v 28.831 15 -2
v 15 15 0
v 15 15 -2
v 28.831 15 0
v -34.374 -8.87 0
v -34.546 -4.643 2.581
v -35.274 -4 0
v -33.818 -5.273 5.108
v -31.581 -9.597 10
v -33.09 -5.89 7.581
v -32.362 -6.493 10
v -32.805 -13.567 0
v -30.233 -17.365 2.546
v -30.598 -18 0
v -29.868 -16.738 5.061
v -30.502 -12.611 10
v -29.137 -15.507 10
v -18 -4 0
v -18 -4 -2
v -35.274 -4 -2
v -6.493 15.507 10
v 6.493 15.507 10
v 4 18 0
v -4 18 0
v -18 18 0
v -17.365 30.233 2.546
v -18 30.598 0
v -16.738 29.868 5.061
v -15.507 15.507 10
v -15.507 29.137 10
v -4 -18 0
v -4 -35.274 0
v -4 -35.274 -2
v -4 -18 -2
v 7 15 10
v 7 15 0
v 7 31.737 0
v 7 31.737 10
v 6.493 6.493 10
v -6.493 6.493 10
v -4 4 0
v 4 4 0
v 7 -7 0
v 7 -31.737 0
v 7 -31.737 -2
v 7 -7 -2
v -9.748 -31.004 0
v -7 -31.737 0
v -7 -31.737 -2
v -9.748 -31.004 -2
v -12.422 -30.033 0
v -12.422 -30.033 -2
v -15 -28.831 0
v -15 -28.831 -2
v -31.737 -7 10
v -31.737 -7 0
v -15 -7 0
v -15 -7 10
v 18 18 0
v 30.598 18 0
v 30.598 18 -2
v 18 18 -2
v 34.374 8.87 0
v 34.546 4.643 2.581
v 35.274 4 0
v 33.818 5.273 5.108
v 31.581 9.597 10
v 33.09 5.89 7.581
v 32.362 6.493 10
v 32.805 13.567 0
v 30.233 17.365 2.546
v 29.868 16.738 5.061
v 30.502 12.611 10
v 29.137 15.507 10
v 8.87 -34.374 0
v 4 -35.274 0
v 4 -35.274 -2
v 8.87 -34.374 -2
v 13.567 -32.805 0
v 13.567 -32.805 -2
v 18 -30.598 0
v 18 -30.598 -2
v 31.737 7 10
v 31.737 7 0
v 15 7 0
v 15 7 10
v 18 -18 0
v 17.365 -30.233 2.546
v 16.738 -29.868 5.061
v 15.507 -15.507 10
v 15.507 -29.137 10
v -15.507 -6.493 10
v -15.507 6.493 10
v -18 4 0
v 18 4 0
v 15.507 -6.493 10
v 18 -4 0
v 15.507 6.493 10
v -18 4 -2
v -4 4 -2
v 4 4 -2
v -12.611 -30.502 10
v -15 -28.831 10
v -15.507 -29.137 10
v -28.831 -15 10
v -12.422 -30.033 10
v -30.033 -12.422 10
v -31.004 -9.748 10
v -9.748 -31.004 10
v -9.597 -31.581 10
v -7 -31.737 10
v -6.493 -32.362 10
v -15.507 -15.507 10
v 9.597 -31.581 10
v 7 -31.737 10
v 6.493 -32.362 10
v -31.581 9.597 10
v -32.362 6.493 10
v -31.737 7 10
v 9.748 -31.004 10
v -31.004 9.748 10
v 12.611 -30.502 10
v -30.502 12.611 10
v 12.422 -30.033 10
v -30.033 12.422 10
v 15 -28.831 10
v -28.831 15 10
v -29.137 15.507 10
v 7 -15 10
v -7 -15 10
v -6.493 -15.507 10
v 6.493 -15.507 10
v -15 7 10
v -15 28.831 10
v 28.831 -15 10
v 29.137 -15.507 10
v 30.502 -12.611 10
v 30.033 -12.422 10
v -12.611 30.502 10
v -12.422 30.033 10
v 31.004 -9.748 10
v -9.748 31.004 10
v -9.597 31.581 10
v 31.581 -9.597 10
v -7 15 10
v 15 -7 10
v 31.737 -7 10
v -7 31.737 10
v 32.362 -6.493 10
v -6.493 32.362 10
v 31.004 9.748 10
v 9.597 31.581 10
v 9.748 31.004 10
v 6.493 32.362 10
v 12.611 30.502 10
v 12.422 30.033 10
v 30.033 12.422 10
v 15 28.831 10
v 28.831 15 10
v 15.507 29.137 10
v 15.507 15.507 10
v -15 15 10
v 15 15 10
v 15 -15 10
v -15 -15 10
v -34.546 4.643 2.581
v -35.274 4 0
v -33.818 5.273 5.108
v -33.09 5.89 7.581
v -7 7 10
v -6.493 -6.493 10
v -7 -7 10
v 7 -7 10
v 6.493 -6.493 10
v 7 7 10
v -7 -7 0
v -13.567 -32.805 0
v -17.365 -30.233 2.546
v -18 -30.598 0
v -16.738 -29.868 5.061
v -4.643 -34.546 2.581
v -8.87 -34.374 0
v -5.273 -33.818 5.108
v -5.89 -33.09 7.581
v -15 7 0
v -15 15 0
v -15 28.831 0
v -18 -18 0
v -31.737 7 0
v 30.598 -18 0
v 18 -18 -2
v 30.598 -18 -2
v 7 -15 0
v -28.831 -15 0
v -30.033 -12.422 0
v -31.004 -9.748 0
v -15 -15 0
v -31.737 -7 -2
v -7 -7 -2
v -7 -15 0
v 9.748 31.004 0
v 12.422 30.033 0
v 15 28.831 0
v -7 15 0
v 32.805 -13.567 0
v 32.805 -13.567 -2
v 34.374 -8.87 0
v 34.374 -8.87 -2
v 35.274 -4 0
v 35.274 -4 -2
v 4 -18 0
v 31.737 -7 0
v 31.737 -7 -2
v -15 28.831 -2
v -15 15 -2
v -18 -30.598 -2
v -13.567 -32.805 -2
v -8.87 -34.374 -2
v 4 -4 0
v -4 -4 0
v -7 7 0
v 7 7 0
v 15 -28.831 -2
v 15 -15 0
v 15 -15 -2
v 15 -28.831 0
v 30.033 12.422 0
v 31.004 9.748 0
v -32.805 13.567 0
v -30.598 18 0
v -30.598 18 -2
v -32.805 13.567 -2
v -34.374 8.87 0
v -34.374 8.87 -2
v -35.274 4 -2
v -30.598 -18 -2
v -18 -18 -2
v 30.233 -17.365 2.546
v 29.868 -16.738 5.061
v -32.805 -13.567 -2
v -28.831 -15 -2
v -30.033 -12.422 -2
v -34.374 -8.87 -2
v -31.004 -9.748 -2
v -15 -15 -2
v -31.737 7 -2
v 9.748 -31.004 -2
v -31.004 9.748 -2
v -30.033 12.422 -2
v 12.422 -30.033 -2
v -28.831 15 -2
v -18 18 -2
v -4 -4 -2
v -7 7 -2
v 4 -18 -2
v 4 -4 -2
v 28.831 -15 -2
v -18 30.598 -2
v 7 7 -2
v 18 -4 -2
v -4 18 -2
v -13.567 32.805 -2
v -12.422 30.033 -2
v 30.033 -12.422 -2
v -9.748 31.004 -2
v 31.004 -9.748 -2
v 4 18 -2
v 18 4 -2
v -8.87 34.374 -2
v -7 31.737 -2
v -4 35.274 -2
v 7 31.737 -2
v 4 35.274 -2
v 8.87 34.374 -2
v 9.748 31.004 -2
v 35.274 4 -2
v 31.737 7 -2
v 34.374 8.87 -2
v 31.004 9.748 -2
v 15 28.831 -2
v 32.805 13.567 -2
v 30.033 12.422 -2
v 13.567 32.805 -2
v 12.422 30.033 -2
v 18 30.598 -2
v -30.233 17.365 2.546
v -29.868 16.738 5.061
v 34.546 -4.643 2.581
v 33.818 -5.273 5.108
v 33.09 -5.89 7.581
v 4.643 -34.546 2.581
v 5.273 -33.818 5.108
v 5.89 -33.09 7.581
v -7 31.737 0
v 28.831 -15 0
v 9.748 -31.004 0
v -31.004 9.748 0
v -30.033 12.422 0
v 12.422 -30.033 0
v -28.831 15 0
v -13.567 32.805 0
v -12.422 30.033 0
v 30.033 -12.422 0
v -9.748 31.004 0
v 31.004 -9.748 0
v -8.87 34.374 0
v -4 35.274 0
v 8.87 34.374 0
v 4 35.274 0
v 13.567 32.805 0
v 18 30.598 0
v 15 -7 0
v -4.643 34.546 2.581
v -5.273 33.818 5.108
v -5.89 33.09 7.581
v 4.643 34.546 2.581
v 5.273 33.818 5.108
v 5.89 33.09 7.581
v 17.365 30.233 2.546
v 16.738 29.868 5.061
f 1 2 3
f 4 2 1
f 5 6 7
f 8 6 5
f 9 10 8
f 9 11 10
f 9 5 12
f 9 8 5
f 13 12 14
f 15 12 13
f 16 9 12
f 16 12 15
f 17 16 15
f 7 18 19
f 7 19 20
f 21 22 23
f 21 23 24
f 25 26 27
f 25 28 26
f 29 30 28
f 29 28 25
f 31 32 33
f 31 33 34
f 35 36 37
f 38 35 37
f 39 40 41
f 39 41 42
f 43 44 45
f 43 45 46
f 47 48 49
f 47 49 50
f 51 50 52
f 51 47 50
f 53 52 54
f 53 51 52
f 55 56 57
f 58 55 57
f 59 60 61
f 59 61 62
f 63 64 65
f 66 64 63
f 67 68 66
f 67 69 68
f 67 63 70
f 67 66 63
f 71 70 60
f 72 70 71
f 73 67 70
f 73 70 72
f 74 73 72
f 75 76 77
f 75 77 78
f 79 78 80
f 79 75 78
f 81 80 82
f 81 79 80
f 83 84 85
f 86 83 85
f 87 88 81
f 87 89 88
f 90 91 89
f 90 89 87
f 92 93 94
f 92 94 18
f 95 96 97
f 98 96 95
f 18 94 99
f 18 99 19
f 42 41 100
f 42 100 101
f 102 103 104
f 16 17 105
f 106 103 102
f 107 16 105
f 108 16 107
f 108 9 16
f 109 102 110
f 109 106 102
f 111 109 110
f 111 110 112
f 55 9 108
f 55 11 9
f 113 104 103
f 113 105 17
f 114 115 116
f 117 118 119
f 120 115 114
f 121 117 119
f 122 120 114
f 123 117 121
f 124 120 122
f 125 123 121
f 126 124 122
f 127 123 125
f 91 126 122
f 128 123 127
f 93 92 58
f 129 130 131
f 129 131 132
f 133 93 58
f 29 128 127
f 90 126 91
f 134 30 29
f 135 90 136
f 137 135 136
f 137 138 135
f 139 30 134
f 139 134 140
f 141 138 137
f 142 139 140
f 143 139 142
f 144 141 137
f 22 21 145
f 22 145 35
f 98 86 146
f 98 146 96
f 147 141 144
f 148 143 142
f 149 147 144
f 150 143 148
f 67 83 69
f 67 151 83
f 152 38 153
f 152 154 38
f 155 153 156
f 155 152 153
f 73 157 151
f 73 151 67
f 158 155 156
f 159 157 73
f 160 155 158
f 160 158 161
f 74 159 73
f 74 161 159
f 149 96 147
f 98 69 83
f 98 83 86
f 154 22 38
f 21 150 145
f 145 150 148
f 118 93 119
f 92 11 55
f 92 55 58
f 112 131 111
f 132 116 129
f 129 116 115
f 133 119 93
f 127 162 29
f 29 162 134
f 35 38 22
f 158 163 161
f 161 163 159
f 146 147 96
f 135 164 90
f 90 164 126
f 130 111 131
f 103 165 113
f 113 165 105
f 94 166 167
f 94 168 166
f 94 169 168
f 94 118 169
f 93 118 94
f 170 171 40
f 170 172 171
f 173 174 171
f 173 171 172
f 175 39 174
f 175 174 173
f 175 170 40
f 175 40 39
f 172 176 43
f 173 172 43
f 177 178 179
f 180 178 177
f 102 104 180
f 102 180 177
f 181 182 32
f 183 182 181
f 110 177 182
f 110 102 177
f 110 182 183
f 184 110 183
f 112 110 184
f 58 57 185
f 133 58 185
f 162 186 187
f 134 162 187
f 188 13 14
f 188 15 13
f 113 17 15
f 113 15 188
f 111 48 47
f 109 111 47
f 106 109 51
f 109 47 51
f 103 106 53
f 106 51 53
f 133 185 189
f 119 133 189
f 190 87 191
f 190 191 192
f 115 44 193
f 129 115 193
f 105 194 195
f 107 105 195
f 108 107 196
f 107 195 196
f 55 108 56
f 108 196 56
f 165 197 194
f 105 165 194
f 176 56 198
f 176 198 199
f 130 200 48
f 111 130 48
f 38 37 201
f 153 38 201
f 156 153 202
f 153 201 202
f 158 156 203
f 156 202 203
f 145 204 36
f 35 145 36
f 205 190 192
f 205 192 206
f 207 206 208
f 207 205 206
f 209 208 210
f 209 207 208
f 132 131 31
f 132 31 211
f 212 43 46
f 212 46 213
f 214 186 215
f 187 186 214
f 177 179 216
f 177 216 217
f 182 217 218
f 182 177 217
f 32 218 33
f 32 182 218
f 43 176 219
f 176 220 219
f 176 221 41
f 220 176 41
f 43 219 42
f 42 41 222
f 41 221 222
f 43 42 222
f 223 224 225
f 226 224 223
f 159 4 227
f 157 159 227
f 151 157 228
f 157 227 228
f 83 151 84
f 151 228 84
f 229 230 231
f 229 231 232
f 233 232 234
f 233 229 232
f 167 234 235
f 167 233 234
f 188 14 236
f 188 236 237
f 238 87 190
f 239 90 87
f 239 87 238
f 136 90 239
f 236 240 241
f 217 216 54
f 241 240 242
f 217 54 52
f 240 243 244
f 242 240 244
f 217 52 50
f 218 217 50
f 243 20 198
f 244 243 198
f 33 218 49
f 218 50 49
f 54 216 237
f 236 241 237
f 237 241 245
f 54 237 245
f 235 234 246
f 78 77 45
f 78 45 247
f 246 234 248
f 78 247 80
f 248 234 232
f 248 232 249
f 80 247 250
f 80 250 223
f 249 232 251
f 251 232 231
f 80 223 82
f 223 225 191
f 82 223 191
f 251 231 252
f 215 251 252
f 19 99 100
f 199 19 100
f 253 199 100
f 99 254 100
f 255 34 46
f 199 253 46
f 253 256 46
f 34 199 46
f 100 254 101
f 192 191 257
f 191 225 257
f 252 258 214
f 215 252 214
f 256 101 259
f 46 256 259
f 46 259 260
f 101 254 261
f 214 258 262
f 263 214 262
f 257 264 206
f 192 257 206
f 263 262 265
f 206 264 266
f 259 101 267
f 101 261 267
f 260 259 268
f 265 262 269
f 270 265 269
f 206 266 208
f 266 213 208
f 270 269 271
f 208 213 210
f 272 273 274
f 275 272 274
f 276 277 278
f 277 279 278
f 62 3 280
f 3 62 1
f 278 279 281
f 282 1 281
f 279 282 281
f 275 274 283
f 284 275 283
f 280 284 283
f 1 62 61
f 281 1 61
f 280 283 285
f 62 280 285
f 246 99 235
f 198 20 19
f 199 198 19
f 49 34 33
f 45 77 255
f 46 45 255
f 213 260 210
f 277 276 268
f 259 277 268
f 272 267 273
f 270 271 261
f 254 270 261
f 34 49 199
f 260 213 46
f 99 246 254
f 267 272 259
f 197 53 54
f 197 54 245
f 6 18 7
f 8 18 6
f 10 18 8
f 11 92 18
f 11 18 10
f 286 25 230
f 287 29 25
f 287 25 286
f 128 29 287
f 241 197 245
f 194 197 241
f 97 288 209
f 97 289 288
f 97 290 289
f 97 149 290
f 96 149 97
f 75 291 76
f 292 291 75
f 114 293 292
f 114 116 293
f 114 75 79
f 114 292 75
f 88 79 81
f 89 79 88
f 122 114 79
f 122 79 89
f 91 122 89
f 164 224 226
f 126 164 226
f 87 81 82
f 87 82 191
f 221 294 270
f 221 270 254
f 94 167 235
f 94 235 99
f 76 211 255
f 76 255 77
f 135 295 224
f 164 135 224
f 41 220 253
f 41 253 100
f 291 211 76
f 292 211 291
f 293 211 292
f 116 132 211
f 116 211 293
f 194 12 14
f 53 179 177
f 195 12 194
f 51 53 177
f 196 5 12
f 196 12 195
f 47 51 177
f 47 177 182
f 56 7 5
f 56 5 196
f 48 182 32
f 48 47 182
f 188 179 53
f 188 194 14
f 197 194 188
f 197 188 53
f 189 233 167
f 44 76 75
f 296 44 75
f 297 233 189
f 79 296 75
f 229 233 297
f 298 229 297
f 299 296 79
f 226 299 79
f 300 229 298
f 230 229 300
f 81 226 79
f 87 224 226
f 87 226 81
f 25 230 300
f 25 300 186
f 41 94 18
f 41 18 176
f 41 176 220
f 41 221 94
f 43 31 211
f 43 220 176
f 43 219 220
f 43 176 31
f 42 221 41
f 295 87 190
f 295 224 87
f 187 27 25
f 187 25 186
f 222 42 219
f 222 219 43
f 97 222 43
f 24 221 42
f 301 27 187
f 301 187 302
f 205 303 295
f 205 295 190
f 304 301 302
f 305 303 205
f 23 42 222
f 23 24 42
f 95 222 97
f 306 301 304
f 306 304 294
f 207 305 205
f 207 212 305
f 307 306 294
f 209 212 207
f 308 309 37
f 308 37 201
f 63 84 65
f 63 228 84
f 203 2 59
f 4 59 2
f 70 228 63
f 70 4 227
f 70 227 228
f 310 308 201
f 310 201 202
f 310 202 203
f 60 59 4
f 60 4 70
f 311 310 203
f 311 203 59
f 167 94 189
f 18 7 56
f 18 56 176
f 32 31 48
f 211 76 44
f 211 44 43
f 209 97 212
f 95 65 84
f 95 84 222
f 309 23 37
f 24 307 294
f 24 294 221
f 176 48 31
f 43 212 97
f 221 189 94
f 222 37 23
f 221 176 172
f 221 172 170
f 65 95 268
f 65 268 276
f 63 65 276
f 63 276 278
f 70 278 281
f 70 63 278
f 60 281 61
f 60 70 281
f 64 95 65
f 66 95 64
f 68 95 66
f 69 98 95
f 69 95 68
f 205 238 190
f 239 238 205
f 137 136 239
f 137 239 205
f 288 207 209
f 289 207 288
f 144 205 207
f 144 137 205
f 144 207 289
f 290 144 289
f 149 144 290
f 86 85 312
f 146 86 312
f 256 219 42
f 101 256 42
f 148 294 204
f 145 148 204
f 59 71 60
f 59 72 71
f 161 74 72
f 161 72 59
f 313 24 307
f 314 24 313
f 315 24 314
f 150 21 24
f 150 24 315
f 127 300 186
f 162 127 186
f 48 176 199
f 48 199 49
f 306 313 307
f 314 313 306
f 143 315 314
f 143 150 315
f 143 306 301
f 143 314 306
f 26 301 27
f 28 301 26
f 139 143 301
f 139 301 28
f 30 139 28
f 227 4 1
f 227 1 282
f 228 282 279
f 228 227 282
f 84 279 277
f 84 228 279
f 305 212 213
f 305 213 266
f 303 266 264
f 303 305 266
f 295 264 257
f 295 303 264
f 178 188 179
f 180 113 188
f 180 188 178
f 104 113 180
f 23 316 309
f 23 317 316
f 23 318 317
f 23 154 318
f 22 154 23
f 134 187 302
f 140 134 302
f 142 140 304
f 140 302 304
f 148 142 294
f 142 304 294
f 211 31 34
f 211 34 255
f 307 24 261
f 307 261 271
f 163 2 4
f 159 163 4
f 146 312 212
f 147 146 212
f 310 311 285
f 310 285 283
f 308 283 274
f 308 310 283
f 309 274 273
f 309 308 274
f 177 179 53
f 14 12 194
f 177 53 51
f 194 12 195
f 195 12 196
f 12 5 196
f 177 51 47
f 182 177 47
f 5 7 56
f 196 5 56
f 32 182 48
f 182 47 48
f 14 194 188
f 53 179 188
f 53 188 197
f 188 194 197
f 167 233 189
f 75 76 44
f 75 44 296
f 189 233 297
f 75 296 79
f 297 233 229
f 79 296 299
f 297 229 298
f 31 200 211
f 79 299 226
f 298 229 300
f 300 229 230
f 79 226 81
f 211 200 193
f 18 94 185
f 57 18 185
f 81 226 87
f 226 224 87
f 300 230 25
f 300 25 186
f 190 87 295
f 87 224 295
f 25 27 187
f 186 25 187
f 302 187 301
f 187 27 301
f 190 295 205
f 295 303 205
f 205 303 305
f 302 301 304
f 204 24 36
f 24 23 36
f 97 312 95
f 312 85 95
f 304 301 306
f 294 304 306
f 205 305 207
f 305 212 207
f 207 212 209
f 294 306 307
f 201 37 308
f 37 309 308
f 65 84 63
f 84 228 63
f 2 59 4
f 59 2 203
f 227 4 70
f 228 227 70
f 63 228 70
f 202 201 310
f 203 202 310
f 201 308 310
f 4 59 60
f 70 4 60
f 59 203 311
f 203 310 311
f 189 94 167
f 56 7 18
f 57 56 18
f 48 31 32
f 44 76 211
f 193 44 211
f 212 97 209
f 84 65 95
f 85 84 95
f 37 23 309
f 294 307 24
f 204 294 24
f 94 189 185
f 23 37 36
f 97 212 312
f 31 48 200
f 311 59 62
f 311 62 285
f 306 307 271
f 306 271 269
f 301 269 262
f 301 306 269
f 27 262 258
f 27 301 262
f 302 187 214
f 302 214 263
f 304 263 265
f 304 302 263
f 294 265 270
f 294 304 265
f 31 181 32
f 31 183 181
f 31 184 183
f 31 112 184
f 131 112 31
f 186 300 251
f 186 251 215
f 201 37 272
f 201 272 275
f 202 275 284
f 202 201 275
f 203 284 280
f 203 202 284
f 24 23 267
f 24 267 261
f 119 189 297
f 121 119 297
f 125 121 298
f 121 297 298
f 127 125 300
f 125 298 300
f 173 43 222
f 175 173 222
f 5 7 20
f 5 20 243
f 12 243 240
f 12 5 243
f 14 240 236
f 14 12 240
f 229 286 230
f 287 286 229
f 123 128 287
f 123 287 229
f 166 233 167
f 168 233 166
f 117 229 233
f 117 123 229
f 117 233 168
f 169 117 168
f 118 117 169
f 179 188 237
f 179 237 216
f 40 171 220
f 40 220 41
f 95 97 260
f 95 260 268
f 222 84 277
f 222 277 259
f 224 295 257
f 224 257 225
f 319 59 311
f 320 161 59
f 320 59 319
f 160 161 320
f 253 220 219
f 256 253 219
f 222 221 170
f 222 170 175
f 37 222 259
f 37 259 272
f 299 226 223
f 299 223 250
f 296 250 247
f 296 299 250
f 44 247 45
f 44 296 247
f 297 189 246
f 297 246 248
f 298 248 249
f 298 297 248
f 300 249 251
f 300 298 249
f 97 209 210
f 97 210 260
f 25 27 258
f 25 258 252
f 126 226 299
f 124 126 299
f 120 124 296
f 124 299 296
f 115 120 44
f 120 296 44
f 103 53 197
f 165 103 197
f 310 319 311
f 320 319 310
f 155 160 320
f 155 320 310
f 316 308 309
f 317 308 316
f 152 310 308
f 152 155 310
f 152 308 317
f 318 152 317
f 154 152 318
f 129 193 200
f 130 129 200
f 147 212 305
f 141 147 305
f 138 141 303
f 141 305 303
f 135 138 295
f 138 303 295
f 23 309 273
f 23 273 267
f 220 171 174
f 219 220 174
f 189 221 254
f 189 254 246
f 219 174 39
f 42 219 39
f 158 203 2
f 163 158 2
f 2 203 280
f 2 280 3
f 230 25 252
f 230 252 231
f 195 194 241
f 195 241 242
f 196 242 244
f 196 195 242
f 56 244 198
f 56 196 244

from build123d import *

# Parameters (mm, degrees)
F0_W     = 14
F0_H     = 14
F0_W_2   = 8
F0_H_2   = 8
F1_DEPTH = 10
F2_SIZE2 = 2.49327
F2_SIZE  = 9.99999
F3_SIZE2 = 2.49327
F3_SIZE  = 9.99999
F4_W     = 8
F4_H     = 8
F5_DEPTH = 2


# Not quite as in the source:
# - a fillet or chamfer is up to 0.001 mm smaller than in the source, because OpenCascade refuses the exact size
# - a feature names something its author has since deleted; it is built from what else it names


with BuildPart() as f1:
    # F0 (on Top) → F1 (new body)
    with BuildSketch(Plane.XY):
        Rectangle(F0_W, F0_H)
        Rectangle(F0_W_2, F0_H_2, mode=Mode.SUBTRACT)
    extrude(amount=F1_DEPTH)

    # F3 (size 10 and 2.4932800284 in the source; OpenCascade refuses exactly that, so slightly less here)
    f3_edges = [f1.edges().sort_by_distance(p)[0] for p in [
        (4, 0, 10),
        (0, -4, 10),
        (-4, 0, 10),
        (0, 4, 10),
    ]]
    chamfer(f3_edges, length=F3_SIZE, length2=F3_SIZE2)


with BuildPart() as f1b:
    # F0 (on Top) → F1, piece 2 (new body)
    with BuildSketch(Plane.XY):
        with BuildLine():
            ThreePointArc((-30.5982025616, 18), (-33.6717151002, 11.2456926069), (-35.2739280489, 4))
            Line((-35.2739280489, 4), (-18, 4))
            Line((-18, 4), (-18, -4))
            Line((-18, -4), (-35.2739280489, -4))
            ThreePointArc((-35.2739280489, -4), (-33.6717151002, -11.2456926069), (-30.5982025616, -18))
            Line((-30.5982025616, -18), (-18, -18))
            Line((-18, -18), (-18, -30.5982025616))
            ThreePointArc((-18, -30.5982025616), (-11.2456926069, -33.6717151002), (-4, -35.2739280489))
            Line((-4, -35.2739280489), (-4, -18))
            Line((-4, -18), (4, -18))
            Line((4, -18), (4, -35.2739280489))
            ThreePointArc((4, -35.2739280489), (11.2456926069, -33.6717151002), (18, -30.5982025616))
            Line((18, -30.5982025616), (18, -18))
            Line((18, -18), (30.5982025616, -18))
            ThreePointArc((30.5982025616, -18), (33.6717151002, -11.2456926069), (35.2739280489, -4))
            Line((35.2739280489, -4), (18, -4))
            Line((18, -4), (18, 4))
            Line((18, 4), (35.2739280489, 4))
            ThreePointArc((35.2739280489, 4), (33.6717151002, 11.2456926069), (30.5982025616, 18))
            Line((30.5982025616, 18), (18, 18))
            Line((18, 18), (18, 30.5982025616))
            ThreePointArc((18, 30.5982025616), (11.2456926069, 33.6717151002), (4, 35.2739280489))
            Line((4, 35.2739280489), (4, 18))
            Line((4, 18), (-4, 18))
            Line((-4, 18), (-4, 35.2739280489))
            ThreePointArc((-4, 35.2739280489), (-11.2456926069, 33.6717151002), (-18, 30.5982025616))
            Line((-18, 30.5982025616), (-18, 18))
            Line((-18, 18), (-30.5982025616, 18))
        make_face()
        with BuildLine():
            ThreePointArc((-31.7372021451, 7), (-30.5473253804, 11.0955356834), (-28.8314064867, 15))
            Line((-28.8314064867, 15), (-15, 15))
            Line((-15, 15), (-15, 28.8314064867))
            ThreePointArc((-15, 28.8314064867), (-11.0955356834, 30.5473253804), (-7, 31.7372021451))
            Line((-7, 31.7372021451), (-7, 15))
            Line((-7, 15), (7, 15))
            Line((7, 15), (7, 31.7372021451))
            ThreePointArc((7, 31.7372021451), (11.0955356834, 30.5473253804), (15, 28.8314064867))
            Line((15, 28.8314064867), (15, 15))
            Line((15, 15), (28.8314064867, 15))
            ThreePointArc((28.8314064867, 15), (30.5473253804, 11.0955356834), (31.7372021451, 7))
            Line((31.7372021451, 7), (15, 7))
            Line((15, 7), (15, -7))
            Line((15, -7), (31.7372021451, -7))
            ThreePointArc((31.7372021451, -7), (30.5473253804, -11.0955356834), (28.8314064867, -15))
            Line((28.8314064867, -15), (15, -15))
            Line((15, -15), (15, -28.8314064867))
            ThreePointArc((15, -28.8314064867), (11.0955356834, -30.5473253804), (7, -31.7372021451))
            Line((7, -31.7372021451), (7, -15))
            Line((7, -15), (-7, -15))
            Line((-7, -15), (-7, -31.7372021451))
            ThreePointArc((-7, -31.7372021451), (-11.0955356834, -30.5473253804), (-15, -28.8314064867))
            Line((-15, -28.8314064867), (-15, -15))
            Line((-15, -15), (-28.8314064867, -15))
            ThreePointArc((-28.8314064867, -15), (-30.5473253804, -11.0955356834), (-31.7372021451, -7))
            Line((-31.7372021451, -7), (-15, -7))
            Line((-15, -7), (-15, 7))
            Line((-15, 7), (-31.7372021451, 7))
        make_face(mode=Mode.SUBTRACT)
    extrude(amount=F1_DEPTH)

    # F2 (size 10 and 2.4932800284 in the source; OpenCascade refuses exactly that, so slightly less here)
    f2_edges = [f1b.edges().sort_by_distance(p)[0] for p in [
        (26.636964, -4, 10),
        (33.671715, -11.245693, 10),
        (24.299101, -18, 10),
        (18, -24.299101, 10),
        (11.245693, -33.671715, 10),
        (4, -26.636964, 10),
        (-4, -26.636964, 10),
        (-11.245693, -33.671715, 10),
        (-18, -24.299101, 10),
        (-24.299101, -18, 10),
        (-33.671715, -11.245693, 10),
        (-26.636964, -4, 10),
        (-18, 0, 10),
        (-26.636964, 4, 10),
        (-33.671715, 11.245693, 10),
        (-24.299101, 18, 10),
        (-18, 24.299101, 10),
        (-11.245693, 33.671715, 10),
        (-4, 26.636964, 10),
        (0, 18, 10),
        (4, 26.636964, 10),
        (11.245693, 33.671715, 10),
        (18, 24.299101, 10),
        (24.299101, 18, 10),
        (33.671715, 11.245693, 10),
        (26.636964, 4, 10),
        (18, 0, 10),
        (0, -18, 10),
    ]]
    chamfer(f2_edges, length=F2_SIZE, length2=F2_SIZE2)


with BuildPart() as f5:
    # F4 (on face) → F5 (new body)
    with BuildSketch(Plane.XY):
        with BuildLine():
            Line((-35.2739280489, 4), (-18, 4))
            Line((-18, 4), (-18, -4))
            Line((-18, -4), (-35.2739280489, -4))
            ThreePointArc((-35.2739280489, -4), (-33.6717151002, -11.2456926069), (-30.5982025616, -18))
            Line((-30.5982025616, -18), (-18, -18))
            Line((-18, -18), (-18, -30.5982025616))
            ThreePointArc((-18, -30.5982025616), (-11.2456926069, -33.6717151002), (-4, -35.2739280489))
            Line((-4, -35.2739280489), (-4, -18))
            Line((-4, -18), (4, -18))
            Line((4, -18), (4, -35.2739280489))
            ThreePointArc((4, -35.2739280489), (11.2456926069, -33.6717151002), (18, -30.5982025616))
            Line((18, -30.5982025616), (18, -18))
            Line((18, -18), (30.5982025616, -18))
            ThreePointArc((30.5982025616, -18), (33.6717151002, -11.2456926069), (35.2739280489, -4))
            Line((35.2739280489, -4), (18, -4))
            Line((18, -4), (18, 4))
            Line((18, 4), (35.2739280489, 4))
            ThreePointArc((35.2739280489, 4), (33.6717151002, 11.2456926069), (30.5982025616, 18))
            Line((30.5982025616, 18), (18, 18))
            Line((18, 18), (18, 30.5982025616))
            ThreePointArc((18, 30.5982025616), (11.2456926069, 33.6717151002), (4, 35.2739280489))
            Line((4, 35.2739280489), (4, 18))
            Line((4, 18), (-4, 18))
            Line((-4, 18), (-4, 35.2739280489))
            ThreePointArc((-4, 35.2739280489), (-11.2456926069, 33.6717151002), (-18, 30.5982025616))
            Line((-18, 30.5982025616), (-18, 18))
            Line((-18, 18), (-30.5982025616, 18))
            ThreePointArc((-30.5982025616, 18), (-33.6717151002, 11.2456926069), (-35.2739280489, 4))
        make_face()
        with BuildLine():
            ThreePointArc((-15, 28.8314064867), (-11.0955356834, 30.5473253804), (-7, 31.7372021451))
            Line((-7, 31.7372021451), (-7, 15))
            Line((-7, 15), (7, 15))
            Line((7, 15), (7, 31.7372021451))
            ThreePointArc((7, 31.7372021451), (11.0955356834, 30.5473253804), (15, 28.8314064867))
            Line((15, 28.8314064867), (15, 15))
            Line((15, 15), (28.8314064867, 15))
            ThreePointArc((28.8314064867, 15), (30.5473253804, 11.0955356834), (31.7372021451, 7))
            Line((31.7372021451, 7), (15, 7))
            Line((15, 7), (15, -7))
            Line((15, -7), (31.7372021451, -7))
            ThreePointArc((31.7372021451, -7), (30.5473253804, -11.0955356834), (28.8314064867, -15))
            Line((28.8314064867, -15), (15, -15))
            Line((15, -15), (15, -28.8314064867))
            ThreePointArc((15, -28.8314064867), (11.0955356834, -30.5473253804), (7, -31.7372021451))
            Line((7, -31.7372021451), (7, -15))
            Line((7, -15), (-7, -15))
            Line((-7, -15), (-7, -31.7372021451))
            ThreePointArc((-7, -31.7372021451), (-11.0955356834, -30.5473253804), (-15, -28.8314064867))
            Line((-15, -28.8314064867), (-15, -15))
            Line((-15, -15), (-28.8314064867, -15))
            ThreePointArc((-28.8314064867, -15), (-30.5473253804, -11.0955356834), (-31.7372021451, -7))
            Line((-31.7372021451, -7), (-15, -7))
            Line((-15, -7), (-15, 7))
            Line((-15, 7), (-31.7372021451, 7))
            ThreePointArc((-31.7372021451, 7), (-30.5473253804, 11.0955356834), (-28.8314064867, 15))
            Line((-28.8314064867, 15), (-15, 15))
            Line((-15, 15), (-15, 28.8314064867))
        make_face(mode=Mode.SUBTRACT)
        Polygon((7, 15), (-7, 15), (-7, 7), (-15, 7), (-15, -7), (-7, -7), (-7, -15), (7, -15), (7, -7), (15, -7), (15, 7), (7, 7), align=None)
        Rectangle(F4_W, F4_H, mode=Mode.SUBTRACT)
    extrude(amount=-F5_DEPTH)


solid = Compound([f1.part, f1b.part, f5.part])
